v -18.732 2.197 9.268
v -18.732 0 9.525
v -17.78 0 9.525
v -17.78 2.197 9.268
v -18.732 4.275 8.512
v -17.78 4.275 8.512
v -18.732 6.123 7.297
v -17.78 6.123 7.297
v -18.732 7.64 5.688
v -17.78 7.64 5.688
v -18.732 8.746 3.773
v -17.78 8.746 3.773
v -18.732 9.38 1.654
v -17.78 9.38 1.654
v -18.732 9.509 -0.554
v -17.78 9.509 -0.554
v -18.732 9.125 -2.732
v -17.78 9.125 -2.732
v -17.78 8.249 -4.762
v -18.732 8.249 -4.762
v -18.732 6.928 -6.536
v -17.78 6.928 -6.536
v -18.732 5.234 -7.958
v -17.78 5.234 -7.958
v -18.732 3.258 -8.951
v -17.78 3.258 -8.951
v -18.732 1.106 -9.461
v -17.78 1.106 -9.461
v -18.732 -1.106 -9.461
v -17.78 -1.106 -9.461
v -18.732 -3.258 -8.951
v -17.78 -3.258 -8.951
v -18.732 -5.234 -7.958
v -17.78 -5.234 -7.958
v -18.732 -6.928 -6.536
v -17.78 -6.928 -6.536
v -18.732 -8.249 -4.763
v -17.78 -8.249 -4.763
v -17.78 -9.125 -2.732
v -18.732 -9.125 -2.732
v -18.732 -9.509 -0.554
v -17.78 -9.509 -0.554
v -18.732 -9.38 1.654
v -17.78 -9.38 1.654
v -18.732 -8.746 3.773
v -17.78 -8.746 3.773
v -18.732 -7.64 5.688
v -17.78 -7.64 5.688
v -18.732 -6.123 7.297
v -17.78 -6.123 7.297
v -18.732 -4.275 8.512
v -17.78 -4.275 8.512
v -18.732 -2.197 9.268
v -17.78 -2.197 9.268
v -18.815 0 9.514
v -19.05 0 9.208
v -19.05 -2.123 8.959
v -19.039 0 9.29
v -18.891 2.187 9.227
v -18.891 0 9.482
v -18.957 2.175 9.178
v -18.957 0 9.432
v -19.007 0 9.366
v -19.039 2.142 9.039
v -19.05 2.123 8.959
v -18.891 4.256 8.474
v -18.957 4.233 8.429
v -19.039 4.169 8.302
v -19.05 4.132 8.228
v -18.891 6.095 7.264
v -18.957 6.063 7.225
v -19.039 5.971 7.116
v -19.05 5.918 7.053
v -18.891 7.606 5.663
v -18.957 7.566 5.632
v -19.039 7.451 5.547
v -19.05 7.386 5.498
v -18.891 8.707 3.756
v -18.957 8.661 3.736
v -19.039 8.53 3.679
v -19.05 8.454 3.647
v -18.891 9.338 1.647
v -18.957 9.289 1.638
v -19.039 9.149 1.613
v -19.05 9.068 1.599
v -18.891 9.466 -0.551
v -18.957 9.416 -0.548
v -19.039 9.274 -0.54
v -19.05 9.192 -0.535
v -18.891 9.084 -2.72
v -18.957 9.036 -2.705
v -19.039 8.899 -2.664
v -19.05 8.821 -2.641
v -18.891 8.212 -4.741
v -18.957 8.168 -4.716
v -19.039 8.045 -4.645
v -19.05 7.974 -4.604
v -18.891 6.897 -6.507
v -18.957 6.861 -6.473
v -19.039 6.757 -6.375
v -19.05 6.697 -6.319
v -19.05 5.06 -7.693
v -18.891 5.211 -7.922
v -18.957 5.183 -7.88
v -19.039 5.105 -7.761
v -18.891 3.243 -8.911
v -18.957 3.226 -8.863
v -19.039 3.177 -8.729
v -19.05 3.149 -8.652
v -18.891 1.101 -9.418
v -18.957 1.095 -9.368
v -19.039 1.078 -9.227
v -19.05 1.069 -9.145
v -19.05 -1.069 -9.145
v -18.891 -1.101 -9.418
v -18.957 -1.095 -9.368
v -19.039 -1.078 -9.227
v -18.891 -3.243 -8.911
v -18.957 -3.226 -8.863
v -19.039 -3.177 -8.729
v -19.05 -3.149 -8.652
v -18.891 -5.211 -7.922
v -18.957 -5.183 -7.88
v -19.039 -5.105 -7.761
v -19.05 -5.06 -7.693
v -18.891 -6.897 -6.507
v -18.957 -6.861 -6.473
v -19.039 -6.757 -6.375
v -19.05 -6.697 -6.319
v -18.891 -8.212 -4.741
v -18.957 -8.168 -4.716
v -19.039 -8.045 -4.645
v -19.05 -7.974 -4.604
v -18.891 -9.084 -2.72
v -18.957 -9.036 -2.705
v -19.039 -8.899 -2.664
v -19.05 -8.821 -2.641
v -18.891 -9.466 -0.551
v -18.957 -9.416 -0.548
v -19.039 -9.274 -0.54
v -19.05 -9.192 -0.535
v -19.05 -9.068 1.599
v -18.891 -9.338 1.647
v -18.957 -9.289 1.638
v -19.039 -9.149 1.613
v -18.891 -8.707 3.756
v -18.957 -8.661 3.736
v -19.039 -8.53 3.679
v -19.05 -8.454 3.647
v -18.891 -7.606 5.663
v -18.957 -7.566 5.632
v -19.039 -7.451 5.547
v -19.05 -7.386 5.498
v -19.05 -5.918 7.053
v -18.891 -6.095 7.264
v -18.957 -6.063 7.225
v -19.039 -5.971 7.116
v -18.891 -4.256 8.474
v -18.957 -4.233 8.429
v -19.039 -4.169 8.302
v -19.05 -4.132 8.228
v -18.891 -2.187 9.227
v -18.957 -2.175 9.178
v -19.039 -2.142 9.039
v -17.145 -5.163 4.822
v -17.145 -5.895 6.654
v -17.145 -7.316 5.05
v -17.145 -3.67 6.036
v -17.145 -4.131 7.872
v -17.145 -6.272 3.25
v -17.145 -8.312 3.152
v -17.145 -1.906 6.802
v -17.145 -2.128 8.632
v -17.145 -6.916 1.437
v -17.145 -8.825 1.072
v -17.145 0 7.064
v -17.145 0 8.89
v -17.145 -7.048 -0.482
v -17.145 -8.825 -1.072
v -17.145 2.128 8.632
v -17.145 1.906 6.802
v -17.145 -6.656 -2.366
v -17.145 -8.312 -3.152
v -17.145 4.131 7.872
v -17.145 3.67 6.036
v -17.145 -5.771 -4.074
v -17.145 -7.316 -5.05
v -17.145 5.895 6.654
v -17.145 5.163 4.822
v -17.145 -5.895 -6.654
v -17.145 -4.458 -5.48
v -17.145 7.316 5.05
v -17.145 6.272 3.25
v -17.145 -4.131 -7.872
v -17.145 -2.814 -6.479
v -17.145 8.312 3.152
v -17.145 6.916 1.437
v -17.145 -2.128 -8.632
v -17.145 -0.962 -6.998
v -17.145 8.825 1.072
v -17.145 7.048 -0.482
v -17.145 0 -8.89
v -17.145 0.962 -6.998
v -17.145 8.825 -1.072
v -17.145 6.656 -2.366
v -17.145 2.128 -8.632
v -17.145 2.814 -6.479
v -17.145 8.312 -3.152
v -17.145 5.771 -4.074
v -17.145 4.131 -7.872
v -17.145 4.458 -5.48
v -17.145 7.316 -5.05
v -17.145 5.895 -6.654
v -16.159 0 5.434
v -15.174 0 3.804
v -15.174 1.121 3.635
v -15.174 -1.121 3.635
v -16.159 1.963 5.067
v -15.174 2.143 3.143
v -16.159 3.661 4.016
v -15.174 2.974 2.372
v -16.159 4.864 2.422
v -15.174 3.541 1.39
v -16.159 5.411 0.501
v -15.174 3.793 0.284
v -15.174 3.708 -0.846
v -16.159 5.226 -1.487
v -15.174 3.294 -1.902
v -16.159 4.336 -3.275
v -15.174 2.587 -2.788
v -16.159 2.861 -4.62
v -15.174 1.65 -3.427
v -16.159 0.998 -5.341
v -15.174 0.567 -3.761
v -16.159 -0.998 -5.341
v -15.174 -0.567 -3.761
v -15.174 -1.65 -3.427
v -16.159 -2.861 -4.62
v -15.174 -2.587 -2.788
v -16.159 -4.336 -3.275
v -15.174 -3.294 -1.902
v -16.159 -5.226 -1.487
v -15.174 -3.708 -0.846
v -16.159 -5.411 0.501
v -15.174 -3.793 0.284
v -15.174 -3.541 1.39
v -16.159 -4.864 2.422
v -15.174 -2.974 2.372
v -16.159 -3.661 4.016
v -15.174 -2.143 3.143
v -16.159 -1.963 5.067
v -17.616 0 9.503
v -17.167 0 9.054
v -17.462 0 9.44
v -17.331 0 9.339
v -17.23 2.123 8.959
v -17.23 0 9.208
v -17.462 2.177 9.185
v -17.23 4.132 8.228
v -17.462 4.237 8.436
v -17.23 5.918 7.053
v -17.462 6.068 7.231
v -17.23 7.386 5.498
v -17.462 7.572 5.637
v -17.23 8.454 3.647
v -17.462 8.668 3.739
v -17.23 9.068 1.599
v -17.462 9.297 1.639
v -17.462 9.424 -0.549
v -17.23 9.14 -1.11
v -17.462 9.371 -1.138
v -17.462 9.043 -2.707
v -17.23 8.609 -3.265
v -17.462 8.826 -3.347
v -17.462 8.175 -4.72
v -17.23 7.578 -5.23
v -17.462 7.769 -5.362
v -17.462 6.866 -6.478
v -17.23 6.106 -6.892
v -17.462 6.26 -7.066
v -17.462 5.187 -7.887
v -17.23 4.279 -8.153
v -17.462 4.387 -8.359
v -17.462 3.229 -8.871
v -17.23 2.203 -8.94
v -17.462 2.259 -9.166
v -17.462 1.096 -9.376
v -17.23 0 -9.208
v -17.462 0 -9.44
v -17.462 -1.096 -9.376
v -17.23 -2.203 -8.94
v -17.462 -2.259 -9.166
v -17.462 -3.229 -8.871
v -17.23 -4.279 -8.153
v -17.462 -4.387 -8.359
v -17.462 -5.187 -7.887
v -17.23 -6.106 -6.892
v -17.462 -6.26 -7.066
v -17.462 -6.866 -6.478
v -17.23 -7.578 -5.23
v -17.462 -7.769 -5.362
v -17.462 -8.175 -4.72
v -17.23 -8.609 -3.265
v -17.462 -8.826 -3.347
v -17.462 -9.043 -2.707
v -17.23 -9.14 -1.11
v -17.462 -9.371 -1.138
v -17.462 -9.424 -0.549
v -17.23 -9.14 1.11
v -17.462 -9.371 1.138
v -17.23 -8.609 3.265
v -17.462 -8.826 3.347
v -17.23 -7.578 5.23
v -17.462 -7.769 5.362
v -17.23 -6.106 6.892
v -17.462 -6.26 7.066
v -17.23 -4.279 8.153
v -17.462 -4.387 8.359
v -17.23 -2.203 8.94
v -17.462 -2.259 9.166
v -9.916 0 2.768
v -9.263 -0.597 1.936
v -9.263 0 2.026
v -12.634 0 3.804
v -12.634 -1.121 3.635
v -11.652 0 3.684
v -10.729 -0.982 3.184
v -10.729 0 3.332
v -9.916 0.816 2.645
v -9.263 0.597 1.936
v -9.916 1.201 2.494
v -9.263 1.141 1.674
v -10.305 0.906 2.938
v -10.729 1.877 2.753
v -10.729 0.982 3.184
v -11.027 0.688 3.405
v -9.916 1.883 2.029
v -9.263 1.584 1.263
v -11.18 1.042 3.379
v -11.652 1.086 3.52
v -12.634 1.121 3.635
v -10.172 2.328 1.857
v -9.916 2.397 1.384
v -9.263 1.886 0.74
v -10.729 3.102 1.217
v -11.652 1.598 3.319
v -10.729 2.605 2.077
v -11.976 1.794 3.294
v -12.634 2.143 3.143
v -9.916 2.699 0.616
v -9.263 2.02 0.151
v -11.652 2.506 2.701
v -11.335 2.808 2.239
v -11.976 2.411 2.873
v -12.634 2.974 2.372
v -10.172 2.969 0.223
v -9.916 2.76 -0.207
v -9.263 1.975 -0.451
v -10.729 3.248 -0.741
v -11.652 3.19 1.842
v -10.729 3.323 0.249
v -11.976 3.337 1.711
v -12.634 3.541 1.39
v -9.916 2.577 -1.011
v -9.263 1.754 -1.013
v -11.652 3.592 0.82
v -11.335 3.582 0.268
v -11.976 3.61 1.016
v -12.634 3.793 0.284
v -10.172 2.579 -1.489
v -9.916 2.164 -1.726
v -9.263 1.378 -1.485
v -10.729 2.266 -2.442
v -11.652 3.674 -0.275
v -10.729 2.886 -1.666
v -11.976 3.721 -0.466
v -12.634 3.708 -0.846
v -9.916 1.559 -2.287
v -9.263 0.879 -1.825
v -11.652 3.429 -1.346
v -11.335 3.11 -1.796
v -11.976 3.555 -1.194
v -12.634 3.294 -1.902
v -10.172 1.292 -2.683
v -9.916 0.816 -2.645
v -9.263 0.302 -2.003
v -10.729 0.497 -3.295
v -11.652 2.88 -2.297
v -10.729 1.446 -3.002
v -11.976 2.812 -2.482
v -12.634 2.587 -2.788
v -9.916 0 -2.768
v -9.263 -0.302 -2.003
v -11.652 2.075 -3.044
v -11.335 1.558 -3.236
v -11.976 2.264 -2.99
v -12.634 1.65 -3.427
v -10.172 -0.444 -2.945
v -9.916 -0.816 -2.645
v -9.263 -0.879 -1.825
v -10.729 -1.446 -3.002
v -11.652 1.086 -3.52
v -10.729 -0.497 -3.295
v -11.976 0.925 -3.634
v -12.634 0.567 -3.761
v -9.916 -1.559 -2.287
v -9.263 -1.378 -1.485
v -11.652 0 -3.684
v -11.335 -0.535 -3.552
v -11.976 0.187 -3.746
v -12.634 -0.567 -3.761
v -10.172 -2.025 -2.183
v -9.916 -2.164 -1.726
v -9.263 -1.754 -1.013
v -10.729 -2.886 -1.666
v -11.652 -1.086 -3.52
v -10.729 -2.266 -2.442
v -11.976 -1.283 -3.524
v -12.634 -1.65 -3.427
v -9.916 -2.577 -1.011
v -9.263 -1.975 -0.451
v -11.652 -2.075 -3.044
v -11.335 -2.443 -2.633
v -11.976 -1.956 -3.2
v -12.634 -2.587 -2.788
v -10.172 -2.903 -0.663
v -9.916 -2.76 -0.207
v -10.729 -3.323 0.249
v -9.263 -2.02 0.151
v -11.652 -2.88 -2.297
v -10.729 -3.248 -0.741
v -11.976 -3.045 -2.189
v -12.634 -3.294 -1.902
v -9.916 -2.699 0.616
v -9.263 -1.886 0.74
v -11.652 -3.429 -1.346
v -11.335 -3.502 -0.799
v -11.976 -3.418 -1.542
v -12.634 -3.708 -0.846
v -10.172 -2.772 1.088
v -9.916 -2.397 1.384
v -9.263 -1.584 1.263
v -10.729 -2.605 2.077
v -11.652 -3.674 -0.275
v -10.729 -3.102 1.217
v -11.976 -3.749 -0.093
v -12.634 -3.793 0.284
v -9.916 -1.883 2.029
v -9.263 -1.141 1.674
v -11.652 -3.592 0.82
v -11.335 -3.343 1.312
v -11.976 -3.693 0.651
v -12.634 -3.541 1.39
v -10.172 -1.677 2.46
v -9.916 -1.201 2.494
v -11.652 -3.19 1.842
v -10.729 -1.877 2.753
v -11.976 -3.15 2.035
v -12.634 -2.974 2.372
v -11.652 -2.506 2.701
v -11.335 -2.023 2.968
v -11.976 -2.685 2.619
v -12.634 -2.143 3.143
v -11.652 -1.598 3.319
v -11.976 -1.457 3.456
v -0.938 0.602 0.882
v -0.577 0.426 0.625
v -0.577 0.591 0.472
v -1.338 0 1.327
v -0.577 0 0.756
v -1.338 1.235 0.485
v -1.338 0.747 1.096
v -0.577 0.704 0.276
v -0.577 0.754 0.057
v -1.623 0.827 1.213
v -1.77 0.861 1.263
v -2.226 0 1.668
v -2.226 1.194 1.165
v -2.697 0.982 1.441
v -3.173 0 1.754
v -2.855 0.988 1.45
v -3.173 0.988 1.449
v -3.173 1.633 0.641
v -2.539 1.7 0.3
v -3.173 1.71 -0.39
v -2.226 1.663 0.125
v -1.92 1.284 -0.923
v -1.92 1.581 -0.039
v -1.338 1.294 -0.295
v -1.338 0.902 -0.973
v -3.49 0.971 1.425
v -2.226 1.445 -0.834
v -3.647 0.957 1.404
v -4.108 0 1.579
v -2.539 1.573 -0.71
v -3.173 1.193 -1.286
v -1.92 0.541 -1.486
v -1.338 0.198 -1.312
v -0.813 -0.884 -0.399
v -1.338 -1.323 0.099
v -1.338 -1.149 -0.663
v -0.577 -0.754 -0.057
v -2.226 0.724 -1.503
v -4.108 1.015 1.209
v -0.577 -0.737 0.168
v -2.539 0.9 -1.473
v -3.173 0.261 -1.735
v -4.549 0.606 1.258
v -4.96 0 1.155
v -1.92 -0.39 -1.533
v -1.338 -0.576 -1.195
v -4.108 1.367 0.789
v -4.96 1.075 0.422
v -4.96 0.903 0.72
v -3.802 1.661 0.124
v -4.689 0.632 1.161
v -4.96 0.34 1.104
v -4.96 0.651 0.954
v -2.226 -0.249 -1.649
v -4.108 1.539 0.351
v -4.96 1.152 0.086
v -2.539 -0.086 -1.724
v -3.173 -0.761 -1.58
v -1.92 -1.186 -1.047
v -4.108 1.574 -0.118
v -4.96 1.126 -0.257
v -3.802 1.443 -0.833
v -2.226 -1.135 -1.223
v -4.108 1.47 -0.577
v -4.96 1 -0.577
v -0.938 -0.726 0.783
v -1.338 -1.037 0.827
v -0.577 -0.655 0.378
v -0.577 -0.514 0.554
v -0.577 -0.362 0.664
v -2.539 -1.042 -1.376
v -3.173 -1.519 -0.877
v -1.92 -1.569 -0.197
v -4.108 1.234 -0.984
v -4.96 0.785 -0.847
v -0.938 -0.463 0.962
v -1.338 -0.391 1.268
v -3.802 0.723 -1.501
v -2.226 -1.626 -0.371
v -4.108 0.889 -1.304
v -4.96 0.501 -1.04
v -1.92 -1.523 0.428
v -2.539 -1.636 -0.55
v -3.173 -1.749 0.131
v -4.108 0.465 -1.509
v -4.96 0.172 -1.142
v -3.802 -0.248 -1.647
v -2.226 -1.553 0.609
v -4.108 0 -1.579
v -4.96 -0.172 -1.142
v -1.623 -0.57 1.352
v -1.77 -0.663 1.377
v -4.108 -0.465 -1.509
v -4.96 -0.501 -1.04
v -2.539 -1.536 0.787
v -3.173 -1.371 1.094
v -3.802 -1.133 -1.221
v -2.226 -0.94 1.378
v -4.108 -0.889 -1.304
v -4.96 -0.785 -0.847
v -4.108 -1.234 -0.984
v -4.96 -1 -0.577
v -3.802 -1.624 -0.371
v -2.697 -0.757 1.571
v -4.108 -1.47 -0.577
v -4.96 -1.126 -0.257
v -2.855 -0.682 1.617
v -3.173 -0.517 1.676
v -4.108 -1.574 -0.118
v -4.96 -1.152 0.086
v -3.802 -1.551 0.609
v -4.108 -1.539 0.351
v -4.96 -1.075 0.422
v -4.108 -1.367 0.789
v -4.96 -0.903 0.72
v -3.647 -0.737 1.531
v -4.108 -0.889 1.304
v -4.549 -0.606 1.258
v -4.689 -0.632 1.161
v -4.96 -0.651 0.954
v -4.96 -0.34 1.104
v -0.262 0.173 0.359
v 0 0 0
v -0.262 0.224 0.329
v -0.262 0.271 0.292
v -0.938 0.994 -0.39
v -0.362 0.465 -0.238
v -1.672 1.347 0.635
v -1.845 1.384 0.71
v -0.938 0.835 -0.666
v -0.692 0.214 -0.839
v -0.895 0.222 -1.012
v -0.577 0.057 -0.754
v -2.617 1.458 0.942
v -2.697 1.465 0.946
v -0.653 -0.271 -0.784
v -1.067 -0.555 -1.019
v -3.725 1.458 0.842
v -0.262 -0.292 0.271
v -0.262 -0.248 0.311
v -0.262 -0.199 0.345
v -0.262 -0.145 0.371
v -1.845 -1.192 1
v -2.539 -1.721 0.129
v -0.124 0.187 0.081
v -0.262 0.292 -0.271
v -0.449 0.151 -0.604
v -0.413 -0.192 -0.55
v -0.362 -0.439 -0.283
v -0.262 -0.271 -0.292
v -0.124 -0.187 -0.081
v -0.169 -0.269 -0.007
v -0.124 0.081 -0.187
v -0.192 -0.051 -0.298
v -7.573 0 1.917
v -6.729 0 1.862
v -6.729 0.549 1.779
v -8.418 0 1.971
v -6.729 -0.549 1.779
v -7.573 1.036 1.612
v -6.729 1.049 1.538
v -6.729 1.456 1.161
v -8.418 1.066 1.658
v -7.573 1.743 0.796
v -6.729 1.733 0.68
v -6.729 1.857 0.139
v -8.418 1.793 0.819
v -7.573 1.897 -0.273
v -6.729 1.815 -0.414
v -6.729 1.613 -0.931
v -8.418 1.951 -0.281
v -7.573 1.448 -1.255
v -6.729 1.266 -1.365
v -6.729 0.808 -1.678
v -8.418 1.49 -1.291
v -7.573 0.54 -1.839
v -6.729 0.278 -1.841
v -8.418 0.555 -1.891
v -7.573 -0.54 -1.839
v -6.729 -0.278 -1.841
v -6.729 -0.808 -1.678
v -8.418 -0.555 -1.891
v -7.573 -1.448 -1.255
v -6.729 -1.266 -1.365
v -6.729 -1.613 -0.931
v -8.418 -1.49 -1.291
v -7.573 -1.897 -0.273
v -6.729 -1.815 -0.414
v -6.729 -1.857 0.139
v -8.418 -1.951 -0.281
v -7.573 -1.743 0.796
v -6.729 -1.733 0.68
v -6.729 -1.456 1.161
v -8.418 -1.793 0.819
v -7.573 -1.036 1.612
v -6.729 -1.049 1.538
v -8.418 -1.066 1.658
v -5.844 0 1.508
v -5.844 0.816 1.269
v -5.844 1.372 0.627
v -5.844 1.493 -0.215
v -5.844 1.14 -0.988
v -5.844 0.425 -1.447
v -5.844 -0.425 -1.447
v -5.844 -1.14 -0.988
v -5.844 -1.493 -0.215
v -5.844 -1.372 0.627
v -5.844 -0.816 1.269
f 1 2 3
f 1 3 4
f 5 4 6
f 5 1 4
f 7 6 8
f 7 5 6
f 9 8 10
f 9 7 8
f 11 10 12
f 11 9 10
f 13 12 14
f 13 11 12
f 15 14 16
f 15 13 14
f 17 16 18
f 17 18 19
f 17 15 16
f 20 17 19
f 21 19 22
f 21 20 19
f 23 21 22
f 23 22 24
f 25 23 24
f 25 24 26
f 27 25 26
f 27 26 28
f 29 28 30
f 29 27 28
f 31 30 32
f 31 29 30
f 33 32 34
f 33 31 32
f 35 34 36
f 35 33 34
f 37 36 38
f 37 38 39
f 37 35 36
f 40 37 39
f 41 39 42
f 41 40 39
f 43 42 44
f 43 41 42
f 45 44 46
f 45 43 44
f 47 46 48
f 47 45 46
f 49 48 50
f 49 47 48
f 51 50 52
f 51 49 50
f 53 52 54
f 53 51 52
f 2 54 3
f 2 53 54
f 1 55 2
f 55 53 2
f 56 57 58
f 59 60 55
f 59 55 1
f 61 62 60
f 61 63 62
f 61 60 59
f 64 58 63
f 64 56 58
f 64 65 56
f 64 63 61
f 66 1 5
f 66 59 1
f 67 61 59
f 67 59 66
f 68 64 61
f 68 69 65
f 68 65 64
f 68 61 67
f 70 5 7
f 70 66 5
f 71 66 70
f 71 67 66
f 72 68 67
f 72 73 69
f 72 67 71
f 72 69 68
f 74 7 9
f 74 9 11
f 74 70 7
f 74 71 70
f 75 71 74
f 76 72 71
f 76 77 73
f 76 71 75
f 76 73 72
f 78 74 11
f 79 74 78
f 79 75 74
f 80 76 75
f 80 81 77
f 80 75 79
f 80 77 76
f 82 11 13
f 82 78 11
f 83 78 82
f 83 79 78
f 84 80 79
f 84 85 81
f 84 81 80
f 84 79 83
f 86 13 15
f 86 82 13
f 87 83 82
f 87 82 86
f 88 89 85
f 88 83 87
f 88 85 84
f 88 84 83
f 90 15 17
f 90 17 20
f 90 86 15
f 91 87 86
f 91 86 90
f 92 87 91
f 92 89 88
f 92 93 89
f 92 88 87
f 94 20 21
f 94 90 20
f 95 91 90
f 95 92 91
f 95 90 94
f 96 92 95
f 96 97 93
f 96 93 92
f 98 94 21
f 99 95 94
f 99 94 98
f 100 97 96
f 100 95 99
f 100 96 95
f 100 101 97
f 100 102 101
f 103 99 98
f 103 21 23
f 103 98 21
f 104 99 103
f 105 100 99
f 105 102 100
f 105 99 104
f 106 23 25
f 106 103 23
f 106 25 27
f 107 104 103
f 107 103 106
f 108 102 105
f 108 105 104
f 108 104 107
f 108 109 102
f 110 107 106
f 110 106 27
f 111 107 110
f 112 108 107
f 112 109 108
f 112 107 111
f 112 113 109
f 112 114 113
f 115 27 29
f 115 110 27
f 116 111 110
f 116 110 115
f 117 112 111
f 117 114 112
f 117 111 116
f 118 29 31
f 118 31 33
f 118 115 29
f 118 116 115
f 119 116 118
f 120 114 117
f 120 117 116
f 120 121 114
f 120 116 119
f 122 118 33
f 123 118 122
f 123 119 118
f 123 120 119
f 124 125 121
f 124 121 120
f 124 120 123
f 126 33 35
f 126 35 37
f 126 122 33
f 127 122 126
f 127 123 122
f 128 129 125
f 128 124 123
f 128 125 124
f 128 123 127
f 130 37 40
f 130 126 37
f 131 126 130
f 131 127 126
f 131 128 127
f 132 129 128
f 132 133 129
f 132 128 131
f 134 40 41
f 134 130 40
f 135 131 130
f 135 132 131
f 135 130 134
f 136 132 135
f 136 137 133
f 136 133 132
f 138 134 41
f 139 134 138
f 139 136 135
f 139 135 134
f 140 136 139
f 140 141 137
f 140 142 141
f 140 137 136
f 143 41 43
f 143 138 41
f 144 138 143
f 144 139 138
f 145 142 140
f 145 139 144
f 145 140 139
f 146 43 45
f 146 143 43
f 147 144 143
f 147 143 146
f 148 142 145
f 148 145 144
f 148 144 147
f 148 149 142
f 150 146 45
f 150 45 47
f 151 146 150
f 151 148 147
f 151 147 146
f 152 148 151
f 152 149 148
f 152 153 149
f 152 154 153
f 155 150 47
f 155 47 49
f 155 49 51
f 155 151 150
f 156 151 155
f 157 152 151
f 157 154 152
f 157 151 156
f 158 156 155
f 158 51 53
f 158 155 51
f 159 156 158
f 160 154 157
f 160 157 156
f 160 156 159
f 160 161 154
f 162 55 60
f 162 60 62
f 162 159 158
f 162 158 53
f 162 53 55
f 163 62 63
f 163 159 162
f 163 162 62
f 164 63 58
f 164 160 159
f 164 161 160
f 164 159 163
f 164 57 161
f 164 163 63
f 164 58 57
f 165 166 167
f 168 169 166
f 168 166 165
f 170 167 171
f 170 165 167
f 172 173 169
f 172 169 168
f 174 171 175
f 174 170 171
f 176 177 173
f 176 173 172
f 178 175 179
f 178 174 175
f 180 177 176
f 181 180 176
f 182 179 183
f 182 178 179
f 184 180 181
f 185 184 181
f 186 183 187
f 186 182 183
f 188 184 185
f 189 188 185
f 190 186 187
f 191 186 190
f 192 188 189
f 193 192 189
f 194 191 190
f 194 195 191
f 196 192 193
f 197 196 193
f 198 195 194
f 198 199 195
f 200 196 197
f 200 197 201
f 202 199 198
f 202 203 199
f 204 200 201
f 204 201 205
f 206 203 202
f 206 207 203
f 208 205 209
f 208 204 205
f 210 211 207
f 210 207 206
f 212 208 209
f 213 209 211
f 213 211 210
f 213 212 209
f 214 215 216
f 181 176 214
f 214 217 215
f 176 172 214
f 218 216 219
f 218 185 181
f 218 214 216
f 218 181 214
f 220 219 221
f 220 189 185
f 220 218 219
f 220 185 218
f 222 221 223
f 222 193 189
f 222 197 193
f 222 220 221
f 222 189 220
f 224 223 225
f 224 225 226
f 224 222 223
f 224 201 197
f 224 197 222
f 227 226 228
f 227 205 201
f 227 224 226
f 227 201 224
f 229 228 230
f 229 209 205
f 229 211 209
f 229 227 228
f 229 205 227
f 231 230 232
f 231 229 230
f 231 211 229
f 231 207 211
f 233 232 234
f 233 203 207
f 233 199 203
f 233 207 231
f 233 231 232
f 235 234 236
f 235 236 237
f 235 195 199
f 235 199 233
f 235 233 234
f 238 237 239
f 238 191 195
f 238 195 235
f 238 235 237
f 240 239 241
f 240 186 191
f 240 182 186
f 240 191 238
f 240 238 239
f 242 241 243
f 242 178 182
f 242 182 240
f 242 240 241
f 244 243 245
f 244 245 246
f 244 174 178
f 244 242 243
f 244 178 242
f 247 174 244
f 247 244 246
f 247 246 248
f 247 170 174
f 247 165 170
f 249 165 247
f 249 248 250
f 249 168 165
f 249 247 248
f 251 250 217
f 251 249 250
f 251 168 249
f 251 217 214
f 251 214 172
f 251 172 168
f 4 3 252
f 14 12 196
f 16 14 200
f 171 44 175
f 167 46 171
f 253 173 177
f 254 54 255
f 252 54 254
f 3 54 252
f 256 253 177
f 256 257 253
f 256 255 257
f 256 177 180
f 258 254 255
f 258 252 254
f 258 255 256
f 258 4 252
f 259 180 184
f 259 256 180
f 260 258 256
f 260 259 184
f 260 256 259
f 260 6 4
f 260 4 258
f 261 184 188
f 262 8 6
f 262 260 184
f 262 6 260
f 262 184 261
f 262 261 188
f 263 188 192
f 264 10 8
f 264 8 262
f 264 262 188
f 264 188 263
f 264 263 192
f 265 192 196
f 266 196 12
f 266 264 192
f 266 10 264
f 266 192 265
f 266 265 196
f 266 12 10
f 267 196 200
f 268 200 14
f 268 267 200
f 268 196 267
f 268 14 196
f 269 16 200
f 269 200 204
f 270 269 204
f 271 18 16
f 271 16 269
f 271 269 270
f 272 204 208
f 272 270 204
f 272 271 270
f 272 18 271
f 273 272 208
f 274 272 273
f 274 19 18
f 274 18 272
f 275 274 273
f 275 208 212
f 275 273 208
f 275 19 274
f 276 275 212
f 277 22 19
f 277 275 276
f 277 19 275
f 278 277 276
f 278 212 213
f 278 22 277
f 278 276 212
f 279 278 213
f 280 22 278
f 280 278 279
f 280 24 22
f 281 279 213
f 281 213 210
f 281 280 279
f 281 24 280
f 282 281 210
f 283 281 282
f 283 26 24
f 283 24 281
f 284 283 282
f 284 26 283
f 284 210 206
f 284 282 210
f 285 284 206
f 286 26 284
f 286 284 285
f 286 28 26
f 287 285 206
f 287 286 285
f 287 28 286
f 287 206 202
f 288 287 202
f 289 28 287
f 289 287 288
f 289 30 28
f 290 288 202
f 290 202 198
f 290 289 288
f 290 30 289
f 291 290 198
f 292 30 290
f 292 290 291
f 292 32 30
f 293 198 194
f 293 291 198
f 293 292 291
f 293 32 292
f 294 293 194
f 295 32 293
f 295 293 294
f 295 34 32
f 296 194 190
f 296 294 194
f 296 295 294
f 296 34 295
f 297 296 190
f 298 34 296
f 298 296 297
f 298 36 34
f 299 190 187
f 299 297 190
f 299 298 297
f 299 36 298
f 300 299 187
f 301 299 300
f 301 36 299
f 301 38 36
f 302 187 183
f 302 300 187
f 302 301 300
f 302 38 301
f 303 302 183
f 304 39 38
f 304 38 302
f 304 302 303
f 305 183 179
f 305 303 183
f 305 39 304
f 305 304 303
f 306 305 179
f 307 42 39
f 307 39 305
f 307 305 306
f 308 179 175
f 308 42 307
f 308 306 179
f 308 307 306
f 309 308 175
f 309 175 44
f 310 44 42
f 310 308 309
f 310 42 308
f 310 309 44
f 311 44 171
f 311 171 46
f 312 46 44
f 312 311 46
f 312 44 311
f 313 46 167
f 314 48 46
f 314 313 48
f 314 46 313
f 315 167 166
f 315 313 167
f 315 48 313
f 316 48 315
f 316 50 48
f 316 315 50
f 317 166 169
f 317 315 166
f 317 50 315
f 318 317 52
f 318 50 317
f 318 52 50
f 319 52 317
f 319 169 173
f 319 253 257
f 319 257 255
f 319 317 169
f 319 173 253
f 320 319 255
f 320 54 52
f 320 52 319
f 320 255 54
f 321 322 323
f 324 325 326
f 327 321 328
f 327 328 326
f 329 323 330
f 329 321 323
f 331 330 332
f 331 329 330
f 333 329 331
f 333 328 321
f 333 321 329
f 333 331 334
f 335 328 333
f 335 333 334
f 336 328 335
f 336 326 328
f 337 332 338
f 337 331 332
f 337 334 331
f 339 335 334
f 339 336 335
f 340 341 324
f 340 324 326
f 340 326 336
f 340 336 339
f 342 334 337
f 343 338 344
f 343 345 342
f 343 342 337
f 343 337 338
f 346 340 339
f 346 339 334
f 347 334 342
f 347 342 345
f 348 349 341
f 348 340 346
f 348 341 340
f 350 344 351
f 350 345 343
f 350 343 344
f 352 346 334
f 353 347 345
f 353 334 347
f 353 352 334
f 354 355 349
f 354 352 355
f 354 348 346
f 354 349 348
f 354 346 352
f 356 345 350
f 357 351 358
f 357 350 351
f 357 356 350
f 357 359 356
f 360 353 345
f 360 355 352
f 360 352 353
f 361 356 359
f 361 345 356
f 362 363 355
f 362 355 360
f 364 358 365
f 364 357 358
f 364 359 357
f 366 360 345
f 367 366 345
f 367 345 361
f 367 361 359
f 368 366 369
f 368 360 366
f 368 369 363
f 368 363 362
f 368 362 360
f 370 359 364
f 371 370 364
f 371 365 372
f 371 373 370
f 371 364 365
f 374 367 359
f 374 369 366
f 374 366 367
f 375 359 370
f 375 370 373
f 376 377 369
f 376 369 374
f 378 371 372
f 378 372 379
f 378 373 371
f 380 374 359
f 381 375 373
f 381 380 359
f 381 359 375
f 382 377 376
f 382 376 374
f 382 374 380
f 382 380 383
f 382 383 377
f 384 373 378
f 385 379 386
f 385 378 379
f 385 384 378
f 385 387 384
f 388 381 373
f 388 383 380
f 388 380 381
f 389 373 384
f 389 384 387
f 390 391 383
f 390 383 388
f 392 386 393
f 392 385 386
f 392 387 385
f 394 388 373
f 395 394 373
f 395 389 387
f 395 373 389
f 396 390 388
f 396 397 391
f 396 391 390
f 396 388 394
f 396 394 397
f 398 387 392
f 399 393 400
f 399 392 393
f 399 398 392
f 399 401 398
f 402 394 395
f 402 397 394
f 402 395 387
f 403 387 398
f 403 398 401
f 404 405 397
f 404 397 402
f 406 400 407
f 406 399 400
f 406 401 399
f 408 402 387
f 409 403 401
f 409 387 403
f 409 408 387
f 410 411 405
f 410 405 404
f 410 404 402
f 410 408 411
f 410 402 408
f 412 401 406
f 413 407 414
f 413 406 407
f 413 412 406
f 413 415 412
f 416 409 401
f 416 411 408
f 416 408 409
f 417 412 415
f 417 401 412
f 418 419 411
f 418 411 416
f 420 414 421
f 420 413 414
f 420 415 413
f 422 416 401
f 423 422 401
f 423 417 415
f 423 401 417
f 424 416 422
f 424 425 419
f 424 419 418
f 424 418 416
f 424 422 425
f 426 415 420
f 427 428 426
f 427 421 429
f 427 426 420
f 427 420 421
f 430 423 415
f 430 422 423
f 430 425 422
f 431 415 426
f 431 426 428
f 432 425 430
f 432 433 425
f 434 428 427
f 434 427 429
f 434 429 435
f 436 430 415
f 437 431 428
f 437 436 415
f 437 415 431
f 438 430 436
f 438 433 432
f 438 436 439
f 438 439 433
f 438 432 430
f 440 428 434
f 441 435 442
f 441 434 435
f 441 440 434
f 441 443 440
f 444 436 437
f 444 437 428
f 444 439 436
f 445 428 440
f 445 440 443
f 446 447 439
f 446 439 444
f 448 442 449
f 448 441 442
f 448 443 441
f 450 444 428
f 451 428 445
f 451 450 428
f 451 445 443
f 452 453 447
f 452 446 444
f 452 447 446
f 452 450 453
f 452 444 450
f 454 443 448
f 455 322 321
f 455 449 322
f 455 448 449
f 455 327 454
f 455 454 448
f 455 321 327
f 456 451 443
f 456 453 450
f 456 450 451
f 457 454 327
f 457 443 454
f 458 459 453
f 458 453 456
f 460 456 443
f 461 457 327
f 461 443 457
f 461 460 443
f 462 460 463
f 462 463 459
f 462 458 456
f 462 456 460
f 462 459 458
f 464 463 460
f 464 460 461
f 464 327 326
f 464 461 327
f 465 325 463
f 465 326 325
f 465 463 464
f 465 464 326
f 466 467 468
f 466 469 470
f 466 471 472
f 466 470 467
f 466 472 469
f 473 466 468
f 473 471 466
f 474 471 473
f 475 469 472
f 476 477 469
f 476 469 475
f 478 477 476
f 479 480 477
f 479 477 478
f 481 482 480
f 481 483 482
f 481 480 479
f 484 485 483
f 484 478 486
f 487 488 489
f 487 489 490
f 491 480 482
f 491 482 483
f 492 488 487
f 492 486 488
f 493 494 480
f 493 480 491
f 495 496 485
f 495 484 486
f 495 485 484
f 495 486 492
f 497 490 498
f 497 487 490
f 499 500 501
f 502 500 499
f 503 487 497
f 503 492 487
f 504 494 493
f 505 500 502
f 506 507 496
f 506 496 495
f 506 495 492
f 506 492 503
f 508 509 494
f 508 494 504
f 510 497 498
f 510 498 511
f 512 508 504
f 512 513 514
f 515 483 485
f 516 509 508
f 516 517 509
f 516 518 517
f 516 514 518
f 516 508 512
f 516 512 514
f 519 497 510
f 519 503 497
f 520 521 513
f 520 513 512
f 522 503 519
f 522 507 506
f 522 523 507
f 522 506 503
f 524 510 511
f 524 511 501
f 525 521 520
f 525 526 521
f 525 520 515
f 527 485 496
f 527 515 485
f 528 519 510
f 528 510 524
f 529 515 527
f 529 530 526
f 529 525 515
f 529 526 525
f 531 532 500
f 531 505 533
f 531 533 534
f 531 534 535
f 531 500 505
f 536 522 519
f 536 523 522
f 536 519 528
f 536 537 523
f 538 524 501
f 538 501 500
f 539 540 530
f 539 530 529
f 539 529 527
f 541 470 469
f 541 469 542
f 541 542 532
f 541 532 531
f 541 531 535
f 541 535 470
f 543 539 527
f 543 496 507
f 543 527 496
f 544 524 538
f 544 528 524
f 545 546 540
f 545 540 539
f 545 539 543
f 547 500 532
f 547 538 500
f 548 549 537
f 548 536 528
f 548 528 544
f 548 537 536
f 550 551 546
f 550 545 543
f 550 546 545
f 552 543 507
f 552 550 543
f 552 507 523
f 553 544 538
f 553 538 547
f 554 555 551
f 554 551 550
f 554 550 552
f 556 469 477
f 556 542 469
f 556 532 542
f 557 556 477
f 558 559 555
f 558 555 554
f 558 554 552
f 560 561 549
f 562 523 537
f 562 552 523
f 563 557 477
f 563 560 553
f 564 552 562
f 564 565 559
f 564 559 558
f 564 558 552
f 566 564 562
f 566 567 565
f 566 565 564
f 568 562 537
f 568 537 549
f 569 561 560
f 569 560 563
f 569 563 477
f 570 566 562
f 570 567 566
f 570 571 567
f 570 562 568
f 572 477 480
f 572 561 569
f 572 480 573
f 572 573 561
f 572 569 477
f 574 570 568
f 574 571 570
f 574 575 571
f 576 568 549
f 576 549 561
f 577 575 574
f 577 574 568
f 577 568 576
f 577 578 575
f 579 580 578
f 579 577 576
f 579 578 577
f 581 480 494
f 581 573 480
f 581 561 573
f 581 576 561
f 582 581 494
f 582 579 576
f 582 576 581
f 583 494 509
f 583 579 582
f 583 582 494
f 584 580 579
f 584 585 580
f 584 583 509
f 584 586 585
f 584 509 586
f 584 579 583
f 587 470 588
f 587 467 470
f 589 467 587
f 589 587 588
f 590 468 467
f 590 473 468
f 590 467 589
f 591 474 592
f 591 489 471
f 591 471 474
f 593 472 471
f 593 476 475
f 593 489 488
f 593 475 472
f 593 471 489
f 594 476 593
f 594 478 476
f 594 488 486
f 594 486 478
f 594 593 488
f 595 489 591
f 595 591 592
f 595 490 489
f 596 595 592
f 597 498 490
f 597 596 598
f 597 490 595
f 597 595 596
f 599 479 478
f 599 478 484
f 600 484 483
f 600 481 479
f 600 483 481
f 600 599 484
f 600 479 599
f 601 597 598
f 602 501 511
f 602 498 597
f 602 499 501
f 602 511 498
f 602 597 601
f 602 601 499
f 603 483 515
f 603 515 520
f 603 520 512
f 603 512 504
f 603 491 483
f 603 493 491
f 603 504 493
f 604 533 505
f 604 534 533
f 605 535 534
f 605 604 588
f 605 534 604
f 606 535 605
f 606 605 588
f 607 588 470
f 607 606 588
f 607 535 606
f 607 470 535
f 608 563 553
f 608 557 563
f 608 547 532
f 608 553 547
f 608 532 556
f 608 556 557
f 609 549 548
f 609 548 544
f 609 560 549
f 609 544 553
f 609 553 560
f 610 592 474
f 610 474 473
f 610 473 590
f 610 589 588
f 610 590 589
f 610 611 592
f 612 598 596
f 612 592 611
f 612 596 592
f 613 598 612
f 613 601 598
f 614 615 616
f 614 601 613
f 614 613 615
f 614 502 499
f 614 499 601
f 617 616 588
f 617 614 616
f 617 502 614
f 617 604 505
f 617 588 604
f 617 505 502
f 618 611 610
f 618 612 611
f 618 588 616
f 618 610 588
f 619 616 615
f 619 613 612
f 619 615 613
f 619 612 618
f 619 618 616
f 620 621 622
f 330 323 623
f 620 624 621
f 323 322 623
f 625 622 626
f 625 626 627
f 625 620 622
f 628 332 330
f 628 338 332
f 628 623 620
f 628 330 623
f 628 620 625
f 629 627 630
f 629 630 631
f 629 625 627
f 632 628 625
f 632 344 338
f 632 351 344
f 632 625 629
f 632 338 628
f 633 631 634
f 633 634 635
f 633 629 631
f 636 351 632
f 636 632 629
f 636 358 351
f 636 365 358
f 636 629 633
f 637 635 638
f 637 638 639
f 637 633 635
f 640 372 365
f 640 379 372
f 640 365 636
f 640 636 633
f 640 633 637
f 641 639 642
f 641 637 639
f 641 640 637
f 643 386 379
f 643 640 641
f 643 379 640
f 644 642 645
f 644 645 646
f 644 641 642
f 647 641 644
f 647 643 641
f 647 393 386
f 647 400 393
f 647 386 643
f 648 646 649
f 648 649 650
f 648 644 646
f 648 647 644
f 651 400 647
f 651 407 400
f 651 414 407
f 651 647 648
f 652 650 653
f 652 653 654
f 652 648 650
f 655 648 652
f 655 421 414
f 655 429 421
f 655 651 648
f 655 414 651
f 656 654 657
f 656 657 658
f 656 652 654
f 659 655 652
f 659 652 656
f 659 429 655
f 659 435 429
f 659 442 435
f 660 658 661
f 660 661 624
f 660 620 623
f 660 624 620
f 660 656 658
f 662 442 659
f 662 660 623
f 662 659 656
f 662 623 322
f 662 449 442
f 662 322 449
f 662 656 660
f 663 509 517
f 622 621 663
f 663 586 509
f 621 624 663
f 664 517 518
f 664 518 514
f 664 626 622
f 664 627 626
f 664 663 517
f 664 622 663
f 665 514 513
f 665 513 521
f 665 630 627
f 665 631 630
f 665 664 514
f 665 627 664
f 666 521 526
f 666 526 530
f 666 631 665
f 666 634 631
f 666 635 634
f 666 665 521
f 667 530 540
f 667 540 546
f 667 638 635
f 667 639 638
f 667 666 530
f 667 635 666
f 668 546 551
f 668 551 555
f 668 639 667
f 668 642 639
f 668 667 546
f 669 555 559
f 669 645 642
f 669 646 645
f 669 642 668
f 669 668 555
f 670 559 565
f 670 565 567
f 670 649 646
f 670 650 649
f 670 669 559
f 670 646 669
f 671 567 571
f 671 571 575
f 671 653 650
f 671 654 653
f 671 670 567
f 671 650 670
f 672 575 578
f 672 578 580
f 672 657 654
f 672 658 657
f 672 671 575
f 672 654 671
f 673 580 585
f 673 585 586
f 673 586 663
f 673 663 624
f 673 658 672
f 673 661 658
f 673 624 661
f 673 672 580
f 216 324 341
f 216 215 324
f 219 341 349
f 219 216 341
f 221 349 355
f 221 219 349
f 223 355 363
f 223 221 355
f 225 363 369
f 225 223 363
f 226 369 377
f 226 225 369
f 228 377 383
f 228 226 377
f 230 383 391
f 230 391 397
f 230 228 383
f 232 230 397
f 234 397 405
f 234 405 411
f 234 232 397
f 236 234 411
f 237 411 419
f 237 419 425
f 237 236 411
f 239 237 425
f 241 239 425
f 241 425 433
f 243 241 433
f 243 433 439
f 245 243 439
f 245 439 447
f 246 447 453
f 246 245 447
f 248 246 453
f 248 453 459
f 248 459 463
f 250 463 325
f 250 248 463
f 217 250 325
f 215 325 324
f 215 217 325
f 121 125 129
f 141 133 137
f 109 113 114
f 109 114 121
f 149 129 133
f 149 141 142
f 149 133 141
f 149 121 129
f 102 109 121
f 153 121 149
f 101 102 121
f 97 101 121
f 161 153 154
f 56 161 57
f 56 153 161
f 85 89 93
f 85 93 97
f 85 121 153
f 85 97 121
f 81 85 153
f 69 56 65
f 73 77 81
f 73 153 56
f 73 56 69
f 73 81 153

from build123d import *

# Parameters (mm, degrees)
F2_R = 0.635
F3_R = 0.3175


with BuildPart() as f1:
    # F0 (on Front) → F1 (revolve)
    with BuildSketch(Plane.XZ):
        with BuildLine():
            Line((-19.05, 0), (0, 0))
            ThreePointArc((0, 0), (-2.225907, 1.668059), (-4.959707, 1.154812))
            Line((-4.959707, 1.154812), (-6.728575, 1.862012))
            Line((-6.728575, 1.862012), (-9.263298, 2.025665))
            ThreePointArc((-9.263298, 2.025665), (-10.728525, 3.331919), (-12.63395, 3.803665))
            Line((-12.63395, 3.803665), (-15.17395, 3.803665))
            Line((-15.17395, 3.803665), (-17.145, 7.064196))
            Line((-17.145, 7.064196), (-17.145, 9.525))
            Line((-17.145, 9.525), (-19.05, 9.525))
            Line((-19.05, 9.525), (-19.05, 0))
        make_face()
    revolve(axis=Axis((-9.525, 0, 0), (-1, 0, 0)))

    # F2
    f2_edges = [f1.edges().sort_by_distance(p)[0] for p in [
        (-17.145, 0, -9.525),
    ]]
    fillet(f2_edges, radius=F2_R)

    # F3
    f3_edges = [f1.edges().sort_by_distance(p)[0] for p in [
        (-19.05, 0, -9.525),
    ]]
    fillet(f3_edges, radius=F3_R)


solid = f1.part
